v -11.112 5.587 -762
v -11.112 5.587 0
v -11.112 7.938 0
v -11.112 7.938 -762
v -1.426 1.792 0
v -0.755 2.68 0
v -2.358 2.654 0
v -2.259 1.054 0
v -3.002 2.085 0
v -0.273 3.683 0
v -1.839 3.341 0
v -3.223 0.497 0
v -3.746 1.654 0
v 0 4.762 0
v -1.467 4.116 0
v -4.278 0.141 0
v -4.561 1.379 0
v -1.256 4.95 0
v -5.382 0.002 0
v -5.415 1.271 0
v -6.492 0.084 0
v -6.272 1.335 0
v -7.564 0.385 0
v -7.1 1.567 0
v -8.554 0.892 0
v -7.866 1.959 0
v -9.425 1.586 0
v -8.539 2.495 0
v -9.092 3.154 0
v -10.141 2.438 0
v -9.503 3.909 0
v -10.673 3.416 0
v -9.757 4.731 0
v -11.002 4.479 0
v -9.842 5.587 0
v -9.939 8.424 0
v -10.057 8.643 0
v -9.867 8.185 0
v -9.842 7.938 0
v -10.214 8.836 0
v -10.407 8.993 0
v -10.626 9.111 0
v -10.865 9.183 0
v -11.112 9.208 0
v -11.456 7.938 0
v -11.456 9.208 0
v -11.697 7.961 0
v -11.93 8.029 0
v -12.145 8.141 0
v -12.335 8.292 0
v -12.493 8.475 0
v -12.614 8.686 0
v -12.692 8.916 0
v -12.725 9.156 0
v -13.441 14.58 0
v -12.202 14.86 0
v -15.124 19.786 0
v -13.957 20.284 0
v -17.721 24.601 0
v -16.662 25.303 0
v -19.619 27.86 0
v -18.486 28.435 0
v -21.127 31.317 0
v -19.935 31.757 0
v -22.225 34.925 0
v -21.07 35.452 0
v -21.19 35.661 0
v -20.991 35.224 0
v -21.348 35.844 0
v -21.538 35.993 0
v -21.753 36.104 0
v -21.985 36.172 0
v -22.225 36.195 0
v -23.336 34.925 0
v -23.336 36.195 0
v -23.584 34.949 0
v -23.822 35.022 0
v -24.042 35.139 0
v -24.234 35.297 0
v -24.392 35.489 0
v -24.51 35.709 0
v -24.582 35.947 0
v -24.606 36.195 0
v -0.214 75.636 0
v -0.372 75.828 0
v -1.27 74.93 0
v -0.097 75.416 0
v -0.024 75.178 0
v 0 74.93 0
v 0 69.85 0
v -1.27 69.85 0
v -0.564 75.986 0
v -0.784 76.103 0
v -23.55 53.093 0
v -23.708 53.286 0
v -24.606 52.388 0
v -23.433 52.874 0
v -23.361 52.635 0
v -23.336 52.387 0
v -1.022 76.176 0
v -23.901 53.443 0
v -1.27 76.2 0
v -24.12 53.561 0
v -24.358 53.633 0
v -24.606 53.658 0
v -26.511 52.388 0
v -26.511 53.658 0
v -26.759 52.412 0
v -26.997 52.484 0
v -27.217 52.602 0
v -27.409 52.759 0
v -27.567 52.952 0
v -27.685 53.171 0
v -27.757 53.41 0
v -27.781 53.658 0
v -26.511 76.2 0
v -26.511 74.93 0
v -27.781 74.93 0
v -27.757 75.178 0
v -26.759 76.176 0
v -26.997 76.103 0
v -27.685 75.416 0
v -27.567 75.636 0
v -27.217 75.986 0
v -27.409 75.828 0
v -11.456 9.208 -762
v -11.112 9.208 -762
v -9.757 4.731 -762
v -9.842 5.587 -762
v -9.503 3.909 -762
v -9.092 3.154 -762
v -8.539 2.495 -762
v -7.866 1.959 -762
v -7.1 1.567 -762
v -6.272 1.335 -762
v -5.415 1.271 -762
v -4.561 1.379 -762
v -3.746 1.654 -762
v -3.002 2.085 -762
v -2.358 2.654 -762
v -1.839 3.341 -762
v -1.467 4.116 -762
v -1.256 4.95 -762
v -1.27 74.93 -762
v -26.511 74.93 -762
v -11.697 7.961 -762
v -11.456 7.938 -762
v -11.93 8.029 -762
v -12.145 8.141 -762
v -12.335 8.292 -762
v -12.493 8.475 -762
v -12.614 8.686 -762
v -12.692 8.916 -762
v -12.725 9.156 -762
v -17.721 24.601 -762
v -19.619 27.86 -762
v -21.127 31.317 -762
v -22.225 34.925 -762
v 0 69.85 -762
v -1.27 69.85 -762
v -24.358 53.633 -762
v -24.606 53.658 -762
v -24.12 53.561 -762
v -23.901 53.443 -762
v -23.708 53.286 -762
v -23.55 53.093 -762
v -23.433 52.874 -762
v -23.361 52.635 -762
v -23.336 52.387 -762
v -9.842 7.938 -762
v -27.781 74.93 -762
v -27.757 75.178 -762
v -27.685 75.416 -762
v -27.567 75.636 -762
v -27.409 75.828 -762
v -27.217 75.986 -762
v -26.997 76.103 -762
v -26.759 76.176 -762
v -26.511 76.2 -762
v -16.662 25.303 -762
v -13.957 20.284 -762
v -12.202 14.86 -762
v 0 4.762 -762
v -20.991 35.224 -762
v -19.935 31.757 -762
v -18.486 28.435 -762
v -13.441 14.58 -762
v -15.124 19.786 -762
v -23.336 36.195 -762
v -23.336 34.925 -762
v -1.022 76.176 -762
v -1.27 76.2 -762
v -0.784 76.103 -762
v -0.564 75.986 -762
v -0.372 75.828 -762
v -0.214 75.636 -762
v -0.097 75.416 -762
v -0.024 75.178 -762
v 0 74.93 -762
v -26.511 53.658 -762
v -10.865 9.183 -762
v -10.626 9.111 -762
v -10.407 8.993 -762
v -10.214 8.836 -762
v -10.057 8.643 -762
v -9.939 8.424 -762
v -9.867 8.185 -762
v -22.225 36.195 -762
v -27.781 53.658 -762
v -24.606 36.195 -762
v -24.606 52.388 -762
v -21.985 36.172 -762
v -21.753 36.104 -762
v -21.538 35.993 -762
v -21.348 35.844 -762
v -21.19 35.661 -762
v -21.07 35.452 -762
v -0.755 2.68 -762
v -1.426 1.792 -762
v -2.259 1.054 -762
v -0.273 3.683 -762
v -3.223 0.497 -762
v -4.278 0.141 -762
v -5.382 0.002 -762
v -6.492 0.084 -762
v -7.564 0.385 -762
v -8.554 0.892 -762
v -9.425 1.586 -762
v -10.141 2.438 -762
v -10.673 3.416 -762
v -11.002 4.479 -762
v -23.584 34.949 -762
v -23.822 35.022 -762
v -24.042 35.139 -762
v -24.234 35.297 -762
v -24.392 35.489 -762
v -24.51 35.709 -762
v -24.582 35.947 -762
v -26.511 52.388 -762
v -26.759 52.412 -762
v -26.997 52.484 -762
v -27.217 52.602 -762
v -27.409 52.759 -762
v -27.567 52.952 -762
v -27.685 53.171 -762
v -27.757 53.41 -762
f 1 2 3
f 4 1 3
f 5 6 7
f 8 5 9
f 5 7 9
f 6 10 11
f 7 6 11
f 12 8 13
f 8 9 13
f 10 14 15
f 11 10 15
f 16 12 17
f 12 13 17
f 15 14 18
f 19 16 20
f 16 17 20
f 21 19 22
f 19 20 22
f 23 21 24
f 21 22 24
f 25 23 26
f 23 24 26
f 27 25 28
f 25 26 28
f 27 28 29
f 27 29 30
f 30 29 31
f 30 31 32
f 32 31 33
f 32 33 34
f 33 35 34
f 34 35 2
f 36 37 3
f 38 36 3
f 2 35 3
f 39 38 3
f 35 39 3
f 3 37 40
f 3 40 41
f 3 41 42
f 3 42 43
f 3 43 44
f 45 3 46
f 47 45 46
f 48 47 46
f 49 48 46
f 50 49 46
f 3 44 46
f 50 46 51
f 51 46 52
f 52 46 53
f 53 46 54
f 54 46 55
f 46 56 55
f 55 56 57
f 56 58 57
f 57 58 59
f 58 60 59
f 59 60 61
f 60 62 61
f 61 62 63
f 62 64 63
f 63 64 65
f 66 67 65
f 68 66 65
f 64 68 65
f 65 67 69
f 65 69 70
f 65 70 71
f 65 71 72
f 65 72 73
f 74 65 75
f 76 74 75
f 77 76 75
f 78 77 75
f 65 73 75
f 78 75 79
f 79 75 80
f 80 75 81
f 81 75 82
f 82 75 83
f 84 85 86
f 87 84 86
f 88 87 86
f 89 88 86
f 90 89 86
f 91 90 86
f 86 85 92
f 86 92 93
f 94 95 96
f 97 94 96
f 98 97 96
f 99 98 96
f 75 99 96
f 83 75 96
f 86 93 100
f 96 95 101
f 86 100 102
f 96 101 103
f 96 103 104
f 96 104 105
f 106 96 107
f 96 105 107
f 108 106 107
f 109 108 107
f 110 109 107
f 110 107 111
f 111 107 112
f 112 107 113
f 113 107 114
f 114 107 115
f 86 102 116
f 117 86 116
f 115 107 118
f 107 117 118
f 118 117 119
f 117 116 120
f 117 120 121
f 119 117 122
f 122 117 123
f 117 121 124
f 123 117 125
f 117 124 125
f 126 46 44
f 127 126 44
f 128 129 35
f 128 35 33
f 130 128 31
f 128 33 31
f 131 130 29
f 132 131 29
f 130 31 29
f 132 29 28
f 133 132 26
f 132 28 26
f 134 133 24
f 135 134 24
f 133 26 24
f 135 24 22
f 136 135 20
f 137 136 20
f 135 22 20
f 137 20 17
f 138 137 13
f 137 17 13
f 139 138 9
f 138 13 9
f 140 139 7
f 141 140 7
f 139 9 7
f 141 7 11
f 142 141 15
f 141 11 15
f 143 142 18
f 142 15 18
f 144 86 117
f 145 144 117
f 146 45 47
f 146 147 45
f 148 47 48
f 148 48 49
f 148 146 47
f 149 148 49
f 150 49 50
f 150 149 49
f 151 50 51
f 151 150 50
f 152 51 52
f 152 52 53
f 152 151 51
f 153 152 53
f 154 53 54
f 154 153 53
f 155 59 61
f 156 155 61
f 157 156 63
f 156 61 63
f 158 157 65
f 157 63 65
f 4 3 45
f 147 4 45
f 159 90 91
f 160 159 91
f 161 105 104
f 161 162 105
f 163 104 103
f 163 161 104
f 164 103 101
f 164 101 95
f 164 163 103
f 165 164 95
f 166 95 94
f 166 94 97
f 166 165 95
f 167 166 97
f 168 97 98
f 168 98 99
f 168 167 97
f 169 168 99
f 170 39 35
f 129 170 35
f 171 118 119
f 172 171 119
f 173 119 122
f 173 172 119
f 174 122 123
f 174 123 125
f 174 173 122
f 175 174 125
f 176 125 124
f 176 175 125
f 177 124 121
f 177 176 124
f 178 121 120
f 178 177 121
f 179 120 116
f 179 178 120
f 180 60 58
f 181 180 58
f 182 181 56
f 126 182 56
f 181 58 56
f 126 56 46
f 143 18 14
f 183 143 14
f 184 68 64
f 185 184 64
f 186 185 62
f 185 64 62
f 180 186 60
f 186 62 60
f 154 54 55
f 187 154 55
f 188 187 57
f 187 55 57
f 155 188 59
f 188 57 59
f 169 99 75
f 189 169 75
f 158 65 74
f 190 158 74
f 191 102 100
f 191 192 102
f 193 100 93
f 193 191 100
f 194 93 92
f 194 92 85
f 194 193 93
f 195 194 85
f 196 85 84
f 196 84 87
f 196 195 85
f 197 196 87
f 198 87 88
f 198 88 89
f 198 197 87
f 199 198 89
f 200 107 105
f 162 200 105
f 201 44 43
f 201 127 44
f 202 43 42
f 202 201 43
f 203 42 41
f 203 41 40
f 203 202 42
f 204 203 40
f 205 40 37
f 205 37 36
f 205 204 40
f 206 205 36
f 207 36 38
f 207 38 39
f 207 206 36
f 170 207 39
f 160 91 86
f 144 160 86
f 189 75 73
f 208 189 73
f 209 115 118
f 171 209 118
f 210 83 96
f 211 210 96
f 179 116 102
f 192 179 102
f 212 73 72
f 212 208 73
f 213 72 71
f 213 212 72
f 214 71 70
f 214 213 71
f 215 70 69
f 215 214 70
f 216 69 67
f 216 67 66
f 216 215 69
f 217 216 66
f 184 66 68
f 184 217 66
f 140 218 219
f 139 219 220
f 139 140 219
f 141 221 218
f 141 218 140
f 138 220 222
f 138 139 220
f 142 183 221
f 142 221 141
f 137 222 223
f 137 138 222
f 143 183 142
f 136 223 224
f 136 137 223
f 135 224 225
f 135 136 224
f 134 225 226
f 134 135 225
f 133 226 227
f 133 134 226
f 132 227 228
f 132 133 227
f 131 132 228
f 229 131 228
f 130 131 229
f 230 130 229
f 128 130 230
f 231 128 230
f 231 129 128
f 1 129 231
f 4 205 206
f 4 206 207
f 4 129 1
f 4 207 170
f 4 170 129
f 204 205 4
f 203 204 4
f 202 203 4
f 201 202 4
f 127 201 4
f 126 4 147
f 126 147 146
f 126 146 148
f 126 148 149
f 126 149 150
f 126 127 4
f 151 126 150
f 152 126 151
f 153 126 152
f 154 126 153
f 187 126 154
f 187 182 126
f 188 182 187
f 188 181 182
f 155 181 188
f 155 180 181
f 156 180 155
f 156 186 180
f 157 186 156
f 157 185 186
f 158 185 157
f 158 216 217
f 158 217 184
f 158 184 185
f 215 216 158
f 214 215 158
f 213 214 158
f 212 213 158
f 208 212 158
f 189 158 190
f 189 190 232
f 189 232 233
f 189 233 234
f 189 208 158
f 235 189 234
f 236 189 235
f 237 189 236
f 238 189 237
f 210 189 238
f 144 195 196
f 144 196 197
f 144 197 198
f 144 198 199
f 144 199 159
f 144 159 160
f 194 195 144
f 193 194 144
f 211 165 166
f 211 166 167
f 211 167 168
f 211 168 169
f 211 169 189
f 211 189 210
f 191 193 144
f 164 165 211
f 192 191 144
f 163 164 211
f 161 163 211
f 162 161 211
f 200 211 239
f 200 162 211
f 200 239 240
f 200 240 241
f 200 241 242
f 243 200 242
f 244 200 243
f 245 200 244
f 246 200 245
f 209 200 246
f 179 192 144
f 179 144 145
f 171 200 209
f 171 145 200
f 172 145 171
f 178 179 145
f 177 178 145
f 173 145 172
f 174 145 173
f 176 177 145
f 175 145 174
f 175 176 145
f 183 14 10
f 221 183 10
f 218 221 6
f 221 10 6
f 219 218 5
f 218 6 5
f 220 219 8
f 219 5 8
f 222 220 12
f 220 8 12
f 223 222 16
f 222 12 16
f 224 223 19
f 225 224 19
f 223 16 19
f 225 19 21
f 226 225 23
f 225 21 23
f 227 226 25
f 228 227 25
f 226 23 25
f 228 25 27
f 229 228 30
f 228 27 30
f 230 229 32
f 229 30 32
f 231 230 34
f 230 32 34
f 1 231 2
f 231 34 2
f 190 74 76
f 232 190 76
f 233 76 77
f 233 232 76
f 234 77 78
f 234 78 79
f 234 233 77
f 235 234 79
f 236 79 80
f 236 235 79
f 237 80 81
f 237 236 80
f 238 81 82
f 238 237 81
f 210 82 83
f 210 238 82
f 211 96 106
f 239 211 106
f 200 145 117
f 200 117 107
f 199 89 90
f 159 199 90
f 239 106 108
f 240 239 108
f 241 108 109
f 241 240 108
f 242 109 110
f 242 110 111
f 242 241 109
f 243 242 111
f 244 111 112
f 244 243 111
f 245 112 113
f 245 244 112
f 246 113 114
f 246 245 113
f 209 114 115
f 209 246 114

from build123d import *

# Parameters (mm, degrees)
EXTRUDE_THIN1_DEPTH = 762
FILLET1_R           = 1.27


with BuildPart() as part:
    # Sketch1 → Extrude-Thin1 (new body)
    with BuildSketch(Plane.XY):
        with BuildLine():
            ThreePointArc((0, 4.7625), (-5.938970367, 0.015308043), (-11.1125, 5.586824141))
            Line((-11.1125, 5.586824141), (-11.1125, 7.9375))
            Line((-11.1125, 7.9375), (-12.7, 7.9375))
            ThreePointArc((-12.7, 7.9375), (-13.982491679, 16.639311629), (-17.720905139, 24.60113148))
            ThreePointArc((-17.720905139, 24.60113148), (-20.42299298, 29.566722219), (-22.225, 34.925))
            Line((-22.225, 34.925), (-24.60625, 34.925))
            Line((-24.60625, 34.925), (-24.60625, 52.3875))
            Line((-24.60625, 52.3875), (-27.78125, 52.3875))
            Line((-27.78125, 52.3875), (-27.78125, 76.2))
            Line((-27.78125, 76.2), (0, 76.2))
            Line((0, 76.2), (0, 69.85))
            Line((0, 69.85), (-1.27, 69.85))
            Line((-1.27, 69.85), (-1.27, 74.93))
            Line((-1.27, 74.93), (-26.51125, 74.93))
            Line((-26.51125, 74.93), (-26.51125, 53.6575))
            Line((-26.51125, 53.6575), (-23.33625, 53.6575))
            Line((-23.33625, 53.6575), (-23.33625, 36.195))
            Line((-23.33625, 36.195), (-21.209398438, 36.195))
            ThreePointArc((-21.209398438, 36.195), (-19.454378473, 30.532415703), (-16.662311672, 25.302758069))
            ThreePointArc((-16.662311672, 25.302758069), (-12.955869325, 17.611976621), (-11.455667045, 9.2075))
            Line((-11.455667045, 9.2075), (-9.8425, 9.2075))
            Line((-9.8425, 9.2075), (-9.8425, 5.586824141))
            ThreePointArc((-9.8425, 5.586824141), (-5.845020027, 1.28182821), (-1.256099738, 4.949885827))
            Line((-1.256099738, 4.949885827), (0, 4.7625))
        make_face()
    extrude(amount=-EXTRUDE_THIN1_DEPTH)

    # Fillet1
    fillet1_edges = [part.edges().sort_by_distance(p)[0] for p in [
        (-23.33625, 53.6575, -381),
        (-21.209398438, 36.195, -381),
        (-9.8425, 9.2075, -381),
        (-12.7, 7.9375, -381),
        (-24.60625, 34.925, -381),
        (-27.78125, 52.3875, -381),
        (-27.78125, 76.2, -381),
        (0, 76.2, -381),
    ]]
    fillet(fillet1_edges, radius=FILLET1_R)


solid = part.part
